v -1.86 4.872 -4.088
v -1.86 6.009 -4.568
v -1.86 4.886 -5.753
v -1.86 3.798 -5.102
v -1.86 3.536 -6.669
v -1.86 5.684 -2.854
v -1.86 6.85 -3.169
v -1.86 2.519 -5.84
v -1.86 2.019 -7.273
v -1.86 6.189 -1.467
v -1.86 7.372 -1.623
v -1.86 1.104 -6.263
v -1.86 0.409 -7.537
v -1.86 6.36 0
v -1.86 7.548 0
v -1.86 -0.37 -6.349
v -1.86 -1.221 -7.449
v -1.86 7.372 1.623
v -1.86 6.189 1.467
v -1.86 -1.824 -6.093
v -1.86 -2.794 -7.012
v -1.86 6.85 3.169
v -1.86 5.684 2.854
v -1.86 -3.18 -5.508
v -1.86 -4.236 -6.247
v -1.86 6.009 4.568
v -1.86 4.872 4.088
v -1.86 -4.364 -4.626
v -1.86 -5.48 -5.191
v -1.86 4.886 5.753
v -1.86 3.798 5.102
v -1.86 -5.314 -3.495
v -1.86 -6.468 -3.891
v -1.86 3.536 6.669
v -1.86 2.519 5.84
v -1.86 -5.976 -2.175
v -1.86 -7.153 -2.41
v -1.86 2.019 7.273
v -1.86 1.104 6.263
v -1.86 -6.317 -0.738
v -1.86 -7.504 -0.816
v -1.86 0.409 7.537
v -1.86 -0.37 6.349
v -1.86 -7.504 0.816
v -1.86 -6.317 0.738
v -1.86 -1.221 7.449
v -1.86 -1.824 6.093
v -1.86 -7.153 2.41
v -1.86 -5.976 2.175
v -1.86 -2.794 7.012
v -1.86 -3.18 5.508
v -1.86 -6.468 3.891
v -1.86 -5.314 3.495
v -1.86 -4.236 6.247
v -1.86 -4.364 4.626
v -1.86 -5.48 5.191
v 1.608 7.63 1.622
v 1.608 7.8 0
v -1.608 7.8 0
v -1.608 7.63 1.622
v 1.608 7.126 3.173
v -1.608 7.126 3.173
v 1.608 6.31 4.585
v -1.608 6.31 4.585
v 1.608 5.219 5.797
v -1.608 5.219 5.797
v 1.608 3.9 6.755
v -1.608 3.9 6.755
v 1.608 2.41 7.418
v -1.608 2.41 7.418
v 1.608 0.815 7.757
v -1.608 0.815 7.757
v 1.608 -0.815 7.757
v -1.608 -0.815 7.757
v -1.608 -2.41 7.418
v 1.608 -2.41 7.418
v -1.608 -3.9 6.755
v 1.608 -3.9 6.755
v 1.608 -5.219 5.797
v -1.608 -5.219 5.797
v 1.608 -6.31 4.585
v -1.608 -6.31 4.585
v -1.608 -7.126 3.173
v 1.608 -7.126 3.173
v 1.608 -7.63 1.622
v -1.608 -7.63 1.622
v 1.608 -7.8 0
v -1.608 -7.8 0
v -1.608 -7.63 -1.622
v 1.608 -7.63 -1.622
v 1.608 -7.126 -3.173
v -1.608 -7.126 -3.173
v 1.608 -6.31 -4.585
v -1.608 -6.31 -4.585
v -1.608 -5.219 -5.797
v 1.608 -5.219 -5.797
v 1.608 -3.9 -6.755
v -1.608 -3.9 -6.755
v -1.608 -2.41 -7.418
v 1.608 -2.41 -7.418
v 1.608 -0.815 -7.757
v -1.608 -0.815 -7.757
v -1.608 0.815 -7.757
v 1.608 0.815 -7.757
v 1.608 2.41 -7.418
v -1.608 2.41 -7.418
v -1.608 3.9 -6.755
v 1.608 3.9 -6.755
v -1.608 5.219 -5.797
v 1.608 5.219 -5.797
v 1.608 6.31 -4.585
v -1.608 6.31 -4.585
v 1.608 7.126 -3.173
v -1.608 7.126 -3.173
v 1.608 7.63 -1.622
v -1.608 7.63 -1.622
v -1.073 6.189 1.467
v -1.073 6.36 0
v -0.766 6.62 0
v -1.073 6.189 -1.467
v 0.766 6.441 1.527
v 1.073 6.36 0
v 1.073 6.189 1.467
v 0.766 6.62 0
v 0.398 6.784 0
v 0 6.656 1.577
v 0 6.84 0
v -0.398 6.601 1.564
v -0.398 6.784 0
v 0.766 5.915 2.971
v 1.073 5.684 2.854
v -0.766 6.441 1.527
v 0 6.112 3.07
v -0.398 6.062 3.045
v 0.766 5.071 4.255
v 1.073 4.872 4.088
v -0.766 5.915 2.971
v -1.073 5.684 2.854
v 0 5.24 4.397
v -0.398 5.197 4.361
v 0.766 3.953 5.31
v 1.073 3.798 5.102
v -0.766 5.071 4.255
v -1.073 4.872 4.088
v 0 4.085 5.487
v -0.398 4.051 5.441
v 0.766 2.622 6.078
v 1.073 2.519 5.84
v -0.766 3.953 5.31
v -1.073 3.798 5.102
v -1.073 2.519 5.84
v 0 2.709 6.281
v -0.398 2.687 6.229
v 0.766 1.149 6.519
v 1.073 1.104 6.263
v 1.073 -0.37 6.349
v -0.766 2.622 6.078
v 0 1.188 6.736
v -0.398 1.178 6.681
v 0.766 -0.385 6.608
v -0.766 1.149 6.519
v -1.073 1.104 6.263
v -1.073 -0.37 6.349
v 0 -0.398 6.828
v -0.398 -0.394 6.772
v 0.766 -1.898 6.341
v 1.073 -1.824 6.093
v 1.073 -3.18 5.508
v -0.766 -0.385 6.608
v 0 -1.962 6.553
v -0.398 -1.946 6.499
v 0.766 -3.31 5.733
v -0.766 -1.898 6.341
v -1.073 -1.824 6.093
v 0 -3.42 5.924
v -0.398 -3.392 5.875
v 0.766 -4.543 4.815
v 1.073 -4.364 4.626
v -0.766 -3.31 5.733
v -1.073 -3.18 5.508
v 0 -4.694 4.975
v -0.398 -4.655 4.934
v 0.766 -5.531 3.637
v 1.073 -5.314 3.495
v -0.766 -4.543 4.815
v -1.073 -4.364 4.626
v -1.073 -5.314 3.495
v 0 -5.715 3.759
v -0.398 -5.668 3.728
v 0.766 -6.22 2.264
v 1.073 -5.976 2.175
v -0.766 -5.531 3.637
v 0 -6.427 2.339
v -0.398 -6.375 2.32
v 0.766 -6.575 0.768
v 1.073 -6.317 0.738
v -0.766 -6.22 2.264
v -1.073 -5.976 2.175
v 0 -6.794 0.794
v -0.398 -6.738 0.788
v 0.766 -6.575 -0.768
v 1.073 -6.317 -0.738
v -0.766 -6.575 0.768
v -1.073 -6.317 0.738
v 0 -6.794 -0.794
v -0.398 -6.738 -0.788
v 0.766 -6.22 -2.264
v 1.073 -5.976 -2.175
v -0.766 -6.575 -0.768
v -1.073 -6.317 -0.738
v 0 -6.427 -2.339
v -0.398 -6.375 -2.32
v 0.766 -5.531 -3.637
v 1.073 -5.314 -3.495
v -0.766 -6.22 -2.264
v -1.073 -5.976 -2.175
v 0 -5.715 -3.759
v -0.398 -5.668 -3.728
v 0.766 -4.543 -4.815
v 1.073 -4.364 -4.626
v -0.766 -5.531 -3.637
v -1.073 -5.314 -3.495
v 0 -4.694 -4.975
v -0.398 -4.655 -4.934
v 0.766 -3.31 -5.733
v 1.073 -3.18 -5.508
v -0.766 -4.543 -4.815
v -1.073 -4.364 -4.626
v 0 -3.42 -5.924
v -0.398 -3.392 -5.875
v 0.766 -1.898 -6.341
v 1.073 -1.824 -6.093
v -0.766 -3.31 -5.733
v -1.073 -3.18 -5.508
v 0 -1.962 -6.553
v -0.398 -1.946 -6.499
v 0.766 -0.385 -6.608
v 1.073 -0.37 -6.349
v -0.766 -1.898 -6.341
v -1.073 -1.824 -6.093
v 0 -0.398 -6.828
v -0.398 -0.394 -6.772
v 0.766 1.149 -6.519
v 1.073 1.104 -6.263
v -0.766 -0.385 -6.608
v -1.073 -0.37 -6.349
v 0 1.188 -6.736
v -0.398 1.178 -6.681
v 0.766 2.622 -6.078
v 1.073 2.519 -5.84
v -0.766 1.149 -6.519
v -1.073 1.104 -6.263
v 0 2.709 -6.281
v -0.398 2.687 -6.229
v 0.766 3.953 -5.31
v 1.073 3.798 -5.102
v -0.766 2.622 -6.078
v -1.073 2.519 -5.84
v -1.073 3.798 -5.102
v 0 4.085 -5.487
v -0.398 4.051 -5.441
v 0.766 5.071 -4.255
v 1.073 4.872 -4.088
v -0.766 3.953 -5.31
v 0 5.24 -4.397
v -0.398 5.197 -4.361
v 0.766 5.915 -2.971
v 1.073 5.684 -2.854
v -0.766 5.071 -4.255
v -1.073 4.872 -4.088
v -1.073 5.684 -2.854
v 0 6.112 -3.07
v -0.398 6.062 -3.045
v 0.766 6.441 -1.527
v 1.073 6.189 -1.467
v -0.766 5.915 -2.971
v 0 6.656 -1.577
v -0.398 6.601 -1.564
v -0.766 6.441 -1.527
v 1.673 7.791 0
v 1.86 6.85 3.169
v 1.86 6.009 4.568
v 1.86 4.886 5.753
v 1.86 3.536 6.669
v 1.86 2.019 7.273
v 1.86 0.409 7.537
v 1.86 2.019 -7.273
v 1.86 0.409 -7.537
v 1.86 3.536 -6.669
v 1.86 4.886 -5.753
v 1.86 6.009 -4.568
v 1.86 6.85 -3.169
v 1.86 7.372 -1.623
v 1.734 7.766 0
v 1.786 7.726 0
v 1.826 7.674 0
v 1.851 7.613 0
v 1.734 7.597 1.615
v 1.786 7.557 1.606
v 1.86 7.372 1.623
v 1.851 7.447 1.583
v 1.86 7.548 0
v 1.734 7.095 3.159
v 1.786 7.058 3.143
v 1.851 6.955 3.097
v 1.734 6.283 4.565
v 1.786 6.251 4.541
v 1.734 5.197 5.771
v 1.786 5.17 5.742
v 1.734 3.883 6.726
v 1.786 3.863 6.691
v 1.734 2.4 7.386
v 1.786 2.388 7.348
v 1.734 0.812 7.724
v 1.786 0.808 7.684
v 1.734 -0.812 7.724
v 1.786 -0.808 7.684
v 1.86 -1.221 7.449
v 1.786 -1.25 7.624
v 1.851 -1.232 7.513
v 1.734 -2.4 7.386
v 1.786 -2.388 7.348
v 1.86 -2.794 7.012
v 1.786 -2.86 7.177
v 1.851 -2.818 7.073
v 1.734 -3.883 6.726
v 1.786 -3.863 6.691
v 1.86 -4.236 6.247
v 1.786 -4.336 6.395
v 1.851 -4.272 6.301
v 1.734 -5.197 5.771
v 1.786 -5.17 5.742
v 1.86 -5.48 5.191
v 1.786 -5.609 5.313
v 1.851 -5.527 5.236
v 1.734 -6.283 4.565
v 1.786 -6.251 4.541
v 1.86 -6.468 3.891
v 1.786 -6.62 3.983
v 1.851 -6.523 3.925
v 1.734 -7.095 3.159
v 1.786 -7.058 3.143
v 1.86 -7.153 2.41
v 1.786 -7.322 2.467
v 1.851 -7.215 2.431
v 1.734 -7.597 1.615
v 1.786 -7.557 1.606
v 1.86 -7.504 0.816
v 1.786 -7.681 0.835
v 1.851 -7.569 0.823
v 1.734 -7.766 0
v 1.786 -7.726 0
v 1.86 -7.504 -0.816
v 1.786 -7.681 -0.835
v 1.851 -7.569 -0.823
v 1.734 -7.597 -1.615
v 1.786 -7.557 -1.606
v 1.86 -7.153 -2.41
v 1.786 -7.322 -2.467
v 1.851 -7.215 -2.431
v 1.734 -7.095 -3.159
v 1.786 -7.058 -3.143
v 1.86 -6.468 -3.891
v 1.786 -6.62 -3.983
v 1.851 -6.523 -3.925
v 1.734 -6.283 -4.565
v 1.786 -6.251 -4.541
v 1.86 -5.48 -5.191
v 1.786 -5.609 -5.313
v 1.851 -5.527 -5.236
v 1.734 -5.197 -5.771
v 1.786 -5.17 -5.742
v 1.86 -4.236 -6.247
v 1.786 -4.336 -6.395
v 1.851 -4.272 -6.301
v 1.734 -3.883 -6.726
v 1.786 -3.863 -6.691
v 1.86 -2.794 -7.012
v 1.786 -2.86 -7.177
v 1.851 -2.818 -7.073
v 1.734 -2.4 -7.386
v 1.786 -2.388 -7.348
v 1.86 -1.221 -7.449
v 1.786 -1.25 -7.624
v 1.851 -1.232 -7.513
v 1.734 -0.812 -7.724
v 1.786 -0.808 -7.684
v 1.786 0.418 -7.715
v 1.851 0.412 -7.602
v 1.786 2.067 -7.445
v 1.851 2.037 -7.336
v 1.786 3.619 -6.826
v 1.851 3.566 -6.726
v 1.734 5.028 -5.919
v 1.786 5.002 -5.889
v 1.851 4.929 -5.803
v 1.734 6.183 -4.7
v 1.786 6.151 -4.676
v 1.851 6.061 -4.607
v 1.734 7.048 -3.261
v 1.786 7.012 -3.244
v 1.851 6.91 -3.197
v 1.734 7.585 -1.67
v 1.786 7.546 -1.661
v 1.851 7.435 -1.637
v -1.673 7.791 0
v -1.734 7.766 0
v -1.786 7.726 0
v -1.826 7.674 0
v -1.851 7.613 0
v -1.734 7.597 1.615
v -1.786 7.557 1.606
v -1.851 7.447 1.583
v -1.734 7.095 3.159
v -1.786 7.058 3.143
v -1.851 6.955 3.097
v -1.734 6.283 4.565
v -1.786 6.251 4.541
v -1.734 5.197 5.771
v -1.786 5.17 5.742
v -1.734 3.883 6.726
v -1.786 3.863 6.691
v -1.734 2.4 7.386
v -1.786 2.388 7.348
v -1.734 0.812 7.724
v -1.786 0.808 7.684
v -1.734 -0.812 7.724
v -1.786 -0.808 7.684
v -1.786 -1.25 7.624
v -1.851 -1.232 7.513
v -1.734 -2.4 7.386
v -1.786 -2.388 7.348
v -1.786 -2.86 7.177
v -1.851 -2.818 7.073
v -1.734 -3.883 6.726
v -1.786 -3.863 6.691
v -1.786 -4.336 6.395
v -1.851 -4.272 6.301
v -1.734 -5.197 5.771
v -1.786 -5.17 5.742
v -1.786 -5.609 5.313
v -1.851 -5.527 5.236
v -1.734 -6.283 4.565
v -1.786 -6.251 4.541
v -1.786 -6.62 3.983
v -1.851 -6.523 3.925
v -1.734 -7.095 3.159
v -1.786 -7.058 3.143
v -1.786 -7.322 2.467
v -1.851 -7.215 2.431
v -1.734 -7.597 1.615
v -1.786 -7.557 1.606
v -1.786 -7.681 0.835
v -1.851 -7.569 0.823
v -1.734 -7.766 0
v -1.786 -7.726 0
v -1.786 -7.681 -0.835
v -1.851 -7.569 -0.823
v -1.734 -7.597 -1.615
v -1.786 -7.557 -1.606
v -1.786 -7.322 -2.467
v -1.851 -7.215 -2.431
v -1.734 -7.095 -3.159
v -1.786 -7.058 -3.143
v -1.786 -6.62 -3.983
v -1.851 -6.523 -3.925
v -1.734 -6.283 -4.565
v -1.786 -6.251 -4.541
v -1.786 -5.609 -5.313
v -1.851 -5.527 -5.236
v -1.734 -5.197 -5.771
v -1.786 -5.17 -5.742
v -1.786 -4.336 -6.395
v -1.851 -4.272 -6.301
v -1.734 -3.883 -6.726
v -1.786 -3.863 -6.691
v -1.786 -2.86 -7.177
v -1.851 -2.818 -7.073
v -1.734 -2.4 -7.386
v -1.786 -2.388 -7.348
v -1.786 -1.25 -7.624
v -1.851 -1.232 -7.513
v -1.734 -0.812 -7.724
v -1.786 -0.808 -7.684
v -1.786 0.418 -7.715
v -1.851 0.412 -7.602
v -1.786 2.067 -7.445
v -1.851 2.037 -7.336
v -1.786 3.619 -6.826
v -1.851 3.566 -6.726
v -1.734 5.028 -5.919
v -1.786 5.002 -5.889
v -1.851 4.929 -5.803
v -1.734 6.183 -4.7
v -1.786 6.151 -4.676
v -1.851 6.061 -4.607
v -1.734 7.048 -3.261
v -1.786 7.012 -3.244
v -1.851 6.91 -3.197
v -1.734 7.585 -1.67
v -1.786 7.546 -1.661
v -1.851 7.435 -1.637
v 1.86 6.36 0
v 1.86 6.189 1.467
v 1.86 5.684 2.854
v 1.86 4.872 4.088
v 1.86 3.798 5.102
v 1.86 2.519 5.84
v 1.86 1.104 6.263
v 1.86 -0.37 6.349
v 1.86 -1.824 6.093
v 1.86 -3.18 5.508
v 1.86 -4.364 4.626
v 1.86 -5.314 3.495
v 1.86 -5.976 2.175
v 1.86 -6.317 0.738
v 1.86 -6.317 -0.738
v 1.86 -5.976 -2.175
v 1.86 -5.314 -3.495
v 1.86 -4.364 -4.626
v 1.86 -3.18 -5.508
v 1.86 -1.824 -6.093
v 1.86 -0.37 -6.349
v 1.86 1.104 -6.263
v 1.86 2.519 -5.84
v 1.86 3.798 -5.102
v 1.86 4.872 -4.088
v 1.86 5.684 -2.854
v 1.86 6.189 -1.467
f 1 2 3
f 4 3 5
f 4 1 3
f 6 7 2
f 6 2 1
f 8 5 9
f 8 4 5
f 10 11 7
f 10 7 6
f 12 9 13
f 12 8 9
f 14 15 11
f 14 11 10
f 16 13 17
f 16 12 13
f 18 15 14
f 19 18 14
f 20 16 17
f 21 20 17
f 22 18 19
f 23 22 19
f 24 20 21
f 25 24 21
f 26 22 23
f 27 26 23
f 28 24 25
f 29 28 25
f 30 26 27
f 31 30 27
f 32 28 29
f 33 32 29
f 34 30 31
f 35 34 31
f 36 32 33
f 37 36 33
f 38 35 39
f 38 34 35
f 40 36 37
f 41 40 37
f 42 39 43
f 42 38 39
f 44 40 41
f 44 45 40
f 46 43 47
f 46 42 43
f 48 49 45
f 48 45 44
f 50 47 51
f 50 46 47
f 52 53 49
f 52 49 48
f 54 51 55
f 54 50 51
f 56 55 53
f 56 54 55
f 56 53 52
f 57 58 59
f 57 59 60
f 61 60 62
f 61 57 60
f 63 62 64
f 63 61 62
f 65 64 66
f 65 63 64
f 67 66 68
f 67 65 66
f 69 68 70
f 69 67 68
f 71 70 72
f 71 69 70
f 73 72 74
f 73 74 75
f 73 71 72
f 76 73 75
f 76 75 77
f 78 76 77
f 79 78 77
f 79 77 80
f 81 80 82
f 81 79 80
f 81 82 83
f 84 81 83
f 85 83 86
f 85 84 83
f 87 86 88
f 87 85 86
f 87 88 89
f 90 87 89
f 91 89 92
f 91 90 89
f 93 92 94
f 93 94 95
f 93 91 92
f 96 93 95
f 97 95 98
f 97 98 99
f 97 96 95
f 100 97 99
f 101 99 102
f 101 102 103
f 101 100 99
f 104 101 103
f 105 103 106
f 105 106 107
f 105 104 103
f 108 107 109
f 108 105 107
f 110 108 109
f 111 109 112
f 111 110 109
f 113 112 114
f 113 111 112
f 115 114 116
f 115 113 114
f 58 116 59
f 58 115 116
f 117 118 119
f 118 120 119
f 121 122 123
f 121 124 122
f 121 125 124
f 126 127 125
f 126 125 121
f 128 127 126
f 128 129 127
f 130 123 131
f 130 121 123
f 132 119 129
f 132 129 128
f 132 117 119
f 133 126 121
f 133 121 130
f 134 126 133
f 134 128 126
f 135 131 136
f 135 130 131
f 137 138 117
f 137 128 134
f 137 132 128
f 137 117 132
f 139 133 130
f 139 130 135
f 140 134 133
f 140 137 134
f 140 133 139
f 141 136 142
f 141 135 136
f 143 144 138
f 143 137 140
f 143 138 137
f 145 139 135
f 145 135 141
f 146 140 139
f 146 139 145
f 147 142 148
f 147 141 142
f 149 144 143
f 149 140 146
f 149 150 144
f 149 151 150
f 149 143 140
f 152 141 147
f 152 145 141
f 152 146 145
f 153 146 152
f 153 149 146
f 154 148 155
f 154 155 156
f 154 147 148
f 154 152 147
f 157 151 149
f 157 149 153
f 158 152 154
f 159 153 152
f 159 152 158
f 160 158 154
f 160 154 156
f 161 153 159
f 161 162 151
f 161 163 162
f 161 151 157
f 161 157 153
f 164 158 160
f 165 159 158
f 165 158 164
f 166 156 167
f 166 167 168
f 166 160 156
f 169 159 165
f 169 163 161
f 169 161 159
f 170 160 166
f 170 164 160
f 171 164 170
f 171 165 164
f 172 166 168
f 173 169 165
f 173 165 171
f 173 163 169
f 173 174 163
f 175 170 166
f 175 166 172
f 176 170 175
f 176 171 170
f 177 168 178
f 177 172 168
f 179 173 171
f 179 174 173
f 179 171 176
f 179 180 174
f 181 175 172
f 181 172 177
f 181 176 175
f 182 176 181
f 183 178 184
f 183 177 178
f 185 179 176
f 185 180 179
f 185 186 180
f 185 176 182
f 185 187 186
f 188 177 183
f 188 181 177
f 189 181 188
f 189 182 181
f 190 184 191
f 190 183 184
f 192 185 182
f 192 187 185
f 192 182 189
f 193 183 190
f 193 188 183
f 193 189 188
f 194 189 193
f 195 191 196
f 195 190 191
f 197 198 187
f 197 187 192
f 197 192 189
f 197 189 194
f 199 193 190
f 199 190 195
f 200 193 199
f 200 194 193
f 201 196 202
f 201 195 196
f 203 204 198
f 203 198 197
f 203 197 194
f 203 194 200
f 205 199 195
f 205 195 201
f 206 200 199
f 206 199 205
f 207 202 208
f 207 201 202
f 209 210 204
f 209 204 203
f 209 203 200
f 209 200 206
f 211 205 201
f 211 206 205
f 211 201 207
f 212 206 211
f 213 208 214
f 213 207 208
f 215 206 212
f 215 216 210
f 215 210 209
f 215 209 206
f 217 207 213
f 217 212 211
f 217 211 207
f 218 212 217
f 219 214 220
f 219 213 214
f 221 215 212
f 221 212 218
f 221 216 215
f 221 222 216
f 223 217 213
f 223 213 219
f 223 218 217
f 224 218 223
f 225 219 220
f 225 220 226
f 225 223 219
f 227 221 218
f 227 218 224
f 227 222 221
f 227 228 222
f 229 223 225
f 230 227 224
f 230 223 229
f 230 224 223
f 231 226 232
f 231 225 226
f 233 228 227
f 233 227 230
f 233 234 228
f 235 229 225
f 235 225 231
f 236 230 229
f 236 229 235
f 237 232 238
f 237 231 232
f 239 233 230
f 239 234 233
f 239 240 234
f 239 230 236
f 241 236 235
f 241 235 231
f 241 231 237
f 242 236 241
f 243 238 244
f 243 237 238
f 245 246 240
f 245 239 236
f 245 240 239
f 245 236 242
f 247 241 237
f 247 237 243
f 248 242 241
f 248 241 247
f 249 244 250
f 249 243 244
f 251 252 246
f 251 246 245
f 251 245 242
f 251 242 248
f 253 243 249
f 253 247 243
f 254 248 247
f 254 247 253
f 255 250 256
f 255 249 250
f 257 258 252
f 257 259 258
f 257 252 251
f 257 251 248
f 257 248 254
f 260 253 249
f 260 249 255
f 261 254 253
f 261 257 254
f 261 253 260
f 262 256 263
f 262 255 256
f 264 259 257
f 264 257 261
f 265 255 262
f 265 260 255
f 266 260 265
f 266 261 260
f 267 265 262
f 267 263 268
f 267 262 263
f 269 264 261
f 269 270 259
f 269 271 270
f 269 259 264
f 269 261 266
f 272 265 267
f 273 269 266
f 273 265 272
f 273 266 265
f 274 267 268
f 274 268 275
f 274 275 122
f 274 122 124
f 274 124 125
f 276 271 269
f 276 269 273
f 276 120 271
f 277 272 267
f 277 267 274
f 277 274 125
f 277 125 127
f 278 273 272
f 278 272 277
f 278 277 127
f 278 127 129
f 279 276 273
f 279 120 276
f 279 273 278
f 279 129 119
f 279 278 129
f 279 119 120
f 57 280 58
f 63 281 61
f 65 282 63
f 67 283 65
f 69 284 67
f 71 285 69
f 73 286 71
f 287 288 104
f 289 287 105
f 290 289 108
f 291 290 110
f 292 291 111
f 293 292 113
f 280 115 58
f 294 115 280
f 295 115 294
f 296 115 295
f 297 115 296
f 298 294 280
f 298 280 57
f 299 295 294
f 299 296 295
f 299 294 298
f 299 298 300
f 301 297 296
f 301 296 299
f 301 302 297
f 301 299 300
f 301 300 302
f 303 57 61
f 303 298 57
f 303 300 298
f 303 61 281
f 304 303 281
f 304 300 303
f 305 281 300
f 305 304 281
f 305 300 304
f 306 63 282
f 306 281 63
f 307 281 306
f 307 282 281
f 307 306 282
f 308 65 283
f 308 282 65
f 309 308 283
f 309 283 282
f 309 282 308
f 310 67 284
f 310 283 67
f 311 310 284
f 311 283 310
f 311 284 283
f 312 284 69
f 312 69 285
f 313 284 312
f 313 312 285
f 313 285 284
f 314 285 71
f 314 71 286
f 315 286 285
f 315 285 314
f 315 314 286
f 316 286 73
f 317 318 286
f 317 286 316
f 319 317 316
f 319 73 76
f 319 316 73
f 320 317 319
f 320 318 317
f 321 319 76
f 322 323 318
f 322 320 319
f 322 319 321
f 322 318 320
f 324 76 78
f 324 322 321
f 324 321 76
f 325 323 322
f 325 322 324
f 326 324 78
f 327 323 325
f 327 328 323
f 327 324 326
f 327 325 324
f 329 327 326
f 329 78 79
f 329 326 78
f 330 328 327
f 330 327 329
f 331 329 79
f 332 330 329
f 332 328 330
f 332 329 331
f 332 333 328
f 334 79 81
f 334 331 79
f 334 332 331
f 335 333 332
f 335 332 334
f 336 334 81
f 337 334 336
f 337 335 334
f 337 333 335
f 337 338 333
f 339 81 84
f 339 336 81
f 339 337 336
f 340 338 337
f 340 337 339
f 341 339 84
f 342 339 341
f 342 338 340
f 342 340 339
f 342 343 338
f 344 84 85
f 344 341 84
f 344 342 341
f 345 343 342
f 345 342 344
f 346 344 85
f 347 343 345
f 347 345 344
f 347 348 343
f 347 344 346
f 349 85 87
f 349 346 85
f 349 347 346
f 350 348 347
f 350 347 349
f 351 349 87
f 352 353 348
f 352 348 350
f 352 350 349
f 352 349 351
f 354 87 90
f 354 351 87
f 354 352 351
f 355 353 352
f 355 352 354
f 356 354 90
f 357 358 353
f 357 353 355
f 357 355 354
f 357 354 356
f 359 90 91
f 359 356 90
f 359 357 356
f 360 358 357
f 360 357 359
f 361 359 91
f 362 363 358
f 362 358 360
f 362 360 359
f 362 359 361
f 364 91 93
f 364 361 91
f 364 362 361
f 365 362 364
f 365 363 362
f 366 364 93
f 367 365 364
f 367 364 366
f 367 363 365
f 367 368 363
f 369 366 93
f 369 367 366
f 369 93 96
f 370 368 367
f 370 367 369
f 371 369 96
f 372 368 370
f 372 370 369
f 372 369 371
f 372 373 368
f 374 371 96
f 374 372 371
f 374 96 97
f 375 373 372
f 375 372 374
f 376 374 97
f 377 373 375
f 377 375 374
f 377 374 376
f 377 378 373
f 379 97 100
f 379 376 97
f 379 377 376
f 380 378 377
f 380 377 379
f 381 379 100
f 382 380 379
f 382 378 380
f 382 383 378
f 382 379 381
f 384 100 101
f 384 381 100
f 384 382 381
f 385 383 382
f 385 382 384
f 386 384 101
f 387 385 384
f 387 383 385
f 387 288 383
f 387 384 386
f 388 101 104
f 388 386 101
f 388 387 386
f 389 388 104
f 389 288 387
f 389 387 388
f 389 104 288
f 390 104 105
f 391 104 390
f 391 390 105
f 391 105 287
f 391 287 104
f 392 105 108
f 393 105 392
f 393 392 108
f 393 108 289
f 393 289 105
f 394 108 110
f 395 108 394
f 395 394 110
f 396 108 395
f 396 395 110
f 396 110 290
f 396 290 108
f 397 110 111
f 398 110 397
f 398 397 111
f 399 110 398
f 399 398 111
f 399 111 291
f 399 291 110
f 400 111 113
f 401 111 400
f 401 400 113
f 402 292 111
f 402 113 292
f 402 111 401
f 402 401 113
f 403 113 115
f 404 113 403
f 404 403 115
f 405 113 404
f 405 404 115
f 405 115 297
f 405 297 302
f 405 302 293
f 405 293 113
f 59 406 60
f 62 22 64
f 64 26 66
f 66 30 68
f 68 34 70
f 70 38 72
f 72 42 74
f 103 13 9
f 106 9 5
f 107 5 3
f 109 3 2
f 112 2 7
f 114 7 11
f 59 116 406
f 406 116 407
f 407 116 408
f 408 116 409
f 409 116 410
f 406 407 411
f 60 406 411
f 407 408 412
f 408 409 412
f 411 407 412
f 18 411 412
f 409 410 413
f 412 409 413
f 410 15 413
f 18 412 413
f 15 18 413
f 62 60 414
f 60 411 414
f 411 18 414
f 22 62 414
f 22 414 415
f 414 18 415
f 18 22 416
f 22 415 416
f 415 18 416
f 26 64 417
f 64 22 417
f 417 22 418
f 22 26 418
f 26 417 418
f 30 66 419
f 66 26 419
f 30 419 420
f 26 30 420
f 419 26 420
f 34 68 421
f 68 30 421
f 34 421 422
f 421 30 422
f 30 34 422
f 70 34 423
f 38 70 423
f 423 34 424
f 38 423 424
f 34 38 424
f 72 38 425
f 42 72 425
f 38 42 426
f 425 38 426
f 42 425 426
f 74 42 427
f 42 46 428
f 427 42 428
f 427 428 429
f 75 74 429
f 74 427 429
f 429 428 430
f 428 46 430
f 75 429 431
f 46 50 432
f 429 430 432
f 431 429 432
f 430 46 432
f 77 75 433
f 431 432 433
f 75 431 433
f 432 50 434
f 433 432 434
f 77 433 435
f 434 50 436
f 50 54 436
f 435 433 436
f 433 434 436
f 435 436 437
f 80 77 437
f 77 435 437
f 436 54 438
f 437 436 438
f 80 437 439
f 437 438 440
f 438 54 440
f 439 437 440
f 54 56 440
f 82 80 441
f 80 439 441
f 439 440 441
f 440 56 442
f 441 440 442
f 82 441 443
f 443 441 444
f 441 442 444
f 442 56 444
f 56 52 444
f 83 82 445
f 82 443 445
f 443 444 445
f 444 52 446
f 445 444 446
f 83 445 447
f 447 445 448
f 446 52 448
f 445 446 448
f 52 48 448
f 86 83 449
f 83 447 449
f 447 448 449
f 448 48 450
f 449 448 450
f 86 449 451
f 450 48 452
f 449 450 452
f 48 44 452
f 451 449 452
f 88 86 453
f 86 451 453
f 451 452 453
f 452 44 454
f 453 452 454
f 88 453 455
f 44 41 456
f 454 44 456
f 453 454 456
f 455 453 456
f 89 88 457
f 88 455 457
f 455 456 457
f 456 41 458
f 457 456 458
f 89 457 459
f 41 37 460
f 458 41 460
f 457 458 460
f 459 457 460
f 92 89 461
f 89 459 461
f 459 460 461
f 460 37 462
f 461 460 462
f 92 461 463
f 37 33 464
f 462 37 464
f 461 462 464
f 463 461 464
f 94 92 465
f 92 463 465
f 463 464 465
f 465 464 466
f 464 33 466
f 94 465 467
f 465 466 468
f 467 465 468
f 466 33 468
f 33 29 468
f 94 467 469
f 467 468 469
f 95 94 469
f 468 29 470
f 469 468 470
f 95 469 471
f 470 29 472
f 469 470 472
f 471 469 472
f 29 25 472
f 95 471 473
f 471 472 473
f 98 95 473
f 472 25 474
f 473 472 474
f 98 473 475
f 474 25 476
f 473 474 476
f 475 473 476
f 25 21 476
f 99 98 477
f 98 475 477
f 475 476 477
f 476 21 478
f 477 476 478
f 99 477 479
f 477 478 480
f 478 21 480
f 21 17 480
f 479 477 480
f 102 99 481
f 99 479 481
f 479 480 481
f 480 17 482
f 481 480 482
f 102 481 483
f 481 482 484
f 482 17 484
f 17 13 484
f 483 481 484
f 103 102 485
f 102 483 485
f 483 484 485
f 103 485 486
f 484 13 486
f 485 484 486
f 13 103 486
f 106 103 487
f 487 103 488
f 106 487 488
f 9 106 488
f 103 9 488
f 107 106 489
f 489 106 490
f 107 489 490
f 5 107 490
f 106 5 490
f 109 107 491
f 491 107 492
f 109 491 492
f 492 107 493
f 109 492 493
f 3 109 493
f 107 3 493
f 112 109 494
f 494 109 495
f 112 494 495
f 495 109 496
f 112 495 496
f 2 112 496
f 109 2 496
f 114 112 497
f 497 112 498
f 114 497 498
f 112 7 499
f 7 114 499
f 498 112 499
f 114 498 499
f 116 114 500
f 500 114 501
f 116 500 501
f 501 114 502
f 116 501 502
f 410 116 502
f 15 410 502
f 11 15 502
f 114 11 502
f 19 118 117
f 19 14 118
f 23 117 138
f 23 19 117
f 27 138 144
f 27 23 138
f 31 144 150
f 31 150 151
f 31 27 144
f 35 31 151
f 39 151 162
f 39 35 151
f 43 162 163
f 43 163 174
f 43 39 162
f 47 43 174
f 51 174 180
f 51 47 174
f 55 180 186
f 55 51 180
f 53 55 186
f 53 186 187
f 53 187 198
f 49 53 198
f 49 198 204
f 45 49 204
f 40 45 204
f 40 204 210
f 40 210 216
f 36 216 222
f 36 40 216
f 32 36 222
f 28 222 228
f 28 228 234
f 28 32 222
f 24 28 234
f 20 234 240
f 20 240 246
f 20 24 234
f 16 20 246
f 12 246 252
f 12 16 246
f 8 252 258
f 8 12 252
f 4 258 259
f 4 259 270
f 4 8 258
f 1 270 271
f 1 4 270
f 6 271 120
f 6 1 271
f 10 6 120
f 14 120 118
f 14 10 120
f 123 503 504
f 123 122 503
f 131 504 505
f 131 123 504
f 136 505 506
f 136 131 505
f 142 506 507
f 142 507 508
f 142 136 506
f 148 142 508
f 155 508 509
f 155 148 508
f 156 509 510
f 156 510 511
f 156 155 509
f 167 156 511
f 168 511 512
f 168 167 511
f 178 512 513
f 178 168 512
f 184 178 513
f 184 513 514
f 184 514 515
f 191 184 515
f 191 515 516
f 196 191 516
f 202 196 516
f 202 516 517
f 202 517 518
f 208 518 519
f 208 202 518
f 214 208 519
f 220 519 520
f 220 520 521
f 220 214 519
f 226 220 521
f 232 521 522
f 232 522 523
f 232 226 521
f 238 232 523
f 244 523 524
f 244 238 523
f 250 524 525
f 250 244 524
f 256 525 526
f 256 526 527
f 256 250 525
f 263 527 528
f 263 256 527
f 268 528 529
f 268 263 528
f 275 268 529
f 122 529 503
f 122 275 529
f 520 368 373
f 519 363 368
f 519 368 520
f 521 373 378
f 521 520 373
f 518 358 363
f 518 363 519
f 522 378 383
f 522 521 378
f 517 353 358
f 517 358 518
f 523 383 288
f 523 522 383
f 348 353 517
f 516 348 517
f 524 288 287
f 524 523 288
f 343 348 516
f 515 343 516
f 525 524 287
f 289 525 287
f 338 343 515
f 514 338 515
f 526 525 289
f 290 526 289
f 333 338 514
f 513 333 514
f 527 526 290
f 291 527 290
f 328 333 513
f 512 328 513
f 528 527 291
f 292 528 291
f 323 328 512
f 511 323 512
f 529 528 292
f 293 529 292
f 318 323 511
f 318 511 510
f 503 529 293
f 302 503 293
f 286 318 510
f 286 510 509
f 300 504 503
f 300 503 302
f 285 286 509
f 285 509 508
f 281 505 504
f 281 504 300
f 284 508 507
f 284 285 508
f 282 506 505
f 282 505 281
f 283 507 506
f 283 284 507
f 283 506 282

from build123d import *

# Parameters (mm, degrees)
FILLET1_R    = 2.1
SCALE1_SCALE = 1.2
SCALE2_SCALE = 0.1


with BuildPart() as part:
    # Sketch1 → Revolve1 (revolve)
    with BuildSketch(Plane.XY):
        with BuildLine():
            Line((-15.5, 65), (15.5, 65))
            Line((15.5, 65), (15.5, 53))
            Line((15.5, 53), (8.94427191, 53))
            ThreePointArc((8.94427191, 53), (0, 57), (-8.94427191, 53))
            Line((-8.94427191, 53), (-15.5, 53))
            Line((-15.5, 53), (-15.5, 65))
        make_face()
    revolve(axis=Axis((-12.809085422, 0, 0), (1, 0, 0)))

    # Fillet1
    fillet1_edges = [part.edges().sort_by_distance(p)[0] for p in [
        (15.5, -65, 0),
        (-15.5, -65, 0),
    ]]
    fillet(fillet1_edges, radius=FILLET1_R)


with BuildPart() as part_1:
    # Scale1: scaled about (0, 0, 0)
    add(part.part.scale(SCALE1_SCALE))


with BuildPart() as part_2:
    # Scale2: scaled about (0, 0, 0)
    add(part_1.part.scale(SCALE2_SCALE))


solid = part_2.part
